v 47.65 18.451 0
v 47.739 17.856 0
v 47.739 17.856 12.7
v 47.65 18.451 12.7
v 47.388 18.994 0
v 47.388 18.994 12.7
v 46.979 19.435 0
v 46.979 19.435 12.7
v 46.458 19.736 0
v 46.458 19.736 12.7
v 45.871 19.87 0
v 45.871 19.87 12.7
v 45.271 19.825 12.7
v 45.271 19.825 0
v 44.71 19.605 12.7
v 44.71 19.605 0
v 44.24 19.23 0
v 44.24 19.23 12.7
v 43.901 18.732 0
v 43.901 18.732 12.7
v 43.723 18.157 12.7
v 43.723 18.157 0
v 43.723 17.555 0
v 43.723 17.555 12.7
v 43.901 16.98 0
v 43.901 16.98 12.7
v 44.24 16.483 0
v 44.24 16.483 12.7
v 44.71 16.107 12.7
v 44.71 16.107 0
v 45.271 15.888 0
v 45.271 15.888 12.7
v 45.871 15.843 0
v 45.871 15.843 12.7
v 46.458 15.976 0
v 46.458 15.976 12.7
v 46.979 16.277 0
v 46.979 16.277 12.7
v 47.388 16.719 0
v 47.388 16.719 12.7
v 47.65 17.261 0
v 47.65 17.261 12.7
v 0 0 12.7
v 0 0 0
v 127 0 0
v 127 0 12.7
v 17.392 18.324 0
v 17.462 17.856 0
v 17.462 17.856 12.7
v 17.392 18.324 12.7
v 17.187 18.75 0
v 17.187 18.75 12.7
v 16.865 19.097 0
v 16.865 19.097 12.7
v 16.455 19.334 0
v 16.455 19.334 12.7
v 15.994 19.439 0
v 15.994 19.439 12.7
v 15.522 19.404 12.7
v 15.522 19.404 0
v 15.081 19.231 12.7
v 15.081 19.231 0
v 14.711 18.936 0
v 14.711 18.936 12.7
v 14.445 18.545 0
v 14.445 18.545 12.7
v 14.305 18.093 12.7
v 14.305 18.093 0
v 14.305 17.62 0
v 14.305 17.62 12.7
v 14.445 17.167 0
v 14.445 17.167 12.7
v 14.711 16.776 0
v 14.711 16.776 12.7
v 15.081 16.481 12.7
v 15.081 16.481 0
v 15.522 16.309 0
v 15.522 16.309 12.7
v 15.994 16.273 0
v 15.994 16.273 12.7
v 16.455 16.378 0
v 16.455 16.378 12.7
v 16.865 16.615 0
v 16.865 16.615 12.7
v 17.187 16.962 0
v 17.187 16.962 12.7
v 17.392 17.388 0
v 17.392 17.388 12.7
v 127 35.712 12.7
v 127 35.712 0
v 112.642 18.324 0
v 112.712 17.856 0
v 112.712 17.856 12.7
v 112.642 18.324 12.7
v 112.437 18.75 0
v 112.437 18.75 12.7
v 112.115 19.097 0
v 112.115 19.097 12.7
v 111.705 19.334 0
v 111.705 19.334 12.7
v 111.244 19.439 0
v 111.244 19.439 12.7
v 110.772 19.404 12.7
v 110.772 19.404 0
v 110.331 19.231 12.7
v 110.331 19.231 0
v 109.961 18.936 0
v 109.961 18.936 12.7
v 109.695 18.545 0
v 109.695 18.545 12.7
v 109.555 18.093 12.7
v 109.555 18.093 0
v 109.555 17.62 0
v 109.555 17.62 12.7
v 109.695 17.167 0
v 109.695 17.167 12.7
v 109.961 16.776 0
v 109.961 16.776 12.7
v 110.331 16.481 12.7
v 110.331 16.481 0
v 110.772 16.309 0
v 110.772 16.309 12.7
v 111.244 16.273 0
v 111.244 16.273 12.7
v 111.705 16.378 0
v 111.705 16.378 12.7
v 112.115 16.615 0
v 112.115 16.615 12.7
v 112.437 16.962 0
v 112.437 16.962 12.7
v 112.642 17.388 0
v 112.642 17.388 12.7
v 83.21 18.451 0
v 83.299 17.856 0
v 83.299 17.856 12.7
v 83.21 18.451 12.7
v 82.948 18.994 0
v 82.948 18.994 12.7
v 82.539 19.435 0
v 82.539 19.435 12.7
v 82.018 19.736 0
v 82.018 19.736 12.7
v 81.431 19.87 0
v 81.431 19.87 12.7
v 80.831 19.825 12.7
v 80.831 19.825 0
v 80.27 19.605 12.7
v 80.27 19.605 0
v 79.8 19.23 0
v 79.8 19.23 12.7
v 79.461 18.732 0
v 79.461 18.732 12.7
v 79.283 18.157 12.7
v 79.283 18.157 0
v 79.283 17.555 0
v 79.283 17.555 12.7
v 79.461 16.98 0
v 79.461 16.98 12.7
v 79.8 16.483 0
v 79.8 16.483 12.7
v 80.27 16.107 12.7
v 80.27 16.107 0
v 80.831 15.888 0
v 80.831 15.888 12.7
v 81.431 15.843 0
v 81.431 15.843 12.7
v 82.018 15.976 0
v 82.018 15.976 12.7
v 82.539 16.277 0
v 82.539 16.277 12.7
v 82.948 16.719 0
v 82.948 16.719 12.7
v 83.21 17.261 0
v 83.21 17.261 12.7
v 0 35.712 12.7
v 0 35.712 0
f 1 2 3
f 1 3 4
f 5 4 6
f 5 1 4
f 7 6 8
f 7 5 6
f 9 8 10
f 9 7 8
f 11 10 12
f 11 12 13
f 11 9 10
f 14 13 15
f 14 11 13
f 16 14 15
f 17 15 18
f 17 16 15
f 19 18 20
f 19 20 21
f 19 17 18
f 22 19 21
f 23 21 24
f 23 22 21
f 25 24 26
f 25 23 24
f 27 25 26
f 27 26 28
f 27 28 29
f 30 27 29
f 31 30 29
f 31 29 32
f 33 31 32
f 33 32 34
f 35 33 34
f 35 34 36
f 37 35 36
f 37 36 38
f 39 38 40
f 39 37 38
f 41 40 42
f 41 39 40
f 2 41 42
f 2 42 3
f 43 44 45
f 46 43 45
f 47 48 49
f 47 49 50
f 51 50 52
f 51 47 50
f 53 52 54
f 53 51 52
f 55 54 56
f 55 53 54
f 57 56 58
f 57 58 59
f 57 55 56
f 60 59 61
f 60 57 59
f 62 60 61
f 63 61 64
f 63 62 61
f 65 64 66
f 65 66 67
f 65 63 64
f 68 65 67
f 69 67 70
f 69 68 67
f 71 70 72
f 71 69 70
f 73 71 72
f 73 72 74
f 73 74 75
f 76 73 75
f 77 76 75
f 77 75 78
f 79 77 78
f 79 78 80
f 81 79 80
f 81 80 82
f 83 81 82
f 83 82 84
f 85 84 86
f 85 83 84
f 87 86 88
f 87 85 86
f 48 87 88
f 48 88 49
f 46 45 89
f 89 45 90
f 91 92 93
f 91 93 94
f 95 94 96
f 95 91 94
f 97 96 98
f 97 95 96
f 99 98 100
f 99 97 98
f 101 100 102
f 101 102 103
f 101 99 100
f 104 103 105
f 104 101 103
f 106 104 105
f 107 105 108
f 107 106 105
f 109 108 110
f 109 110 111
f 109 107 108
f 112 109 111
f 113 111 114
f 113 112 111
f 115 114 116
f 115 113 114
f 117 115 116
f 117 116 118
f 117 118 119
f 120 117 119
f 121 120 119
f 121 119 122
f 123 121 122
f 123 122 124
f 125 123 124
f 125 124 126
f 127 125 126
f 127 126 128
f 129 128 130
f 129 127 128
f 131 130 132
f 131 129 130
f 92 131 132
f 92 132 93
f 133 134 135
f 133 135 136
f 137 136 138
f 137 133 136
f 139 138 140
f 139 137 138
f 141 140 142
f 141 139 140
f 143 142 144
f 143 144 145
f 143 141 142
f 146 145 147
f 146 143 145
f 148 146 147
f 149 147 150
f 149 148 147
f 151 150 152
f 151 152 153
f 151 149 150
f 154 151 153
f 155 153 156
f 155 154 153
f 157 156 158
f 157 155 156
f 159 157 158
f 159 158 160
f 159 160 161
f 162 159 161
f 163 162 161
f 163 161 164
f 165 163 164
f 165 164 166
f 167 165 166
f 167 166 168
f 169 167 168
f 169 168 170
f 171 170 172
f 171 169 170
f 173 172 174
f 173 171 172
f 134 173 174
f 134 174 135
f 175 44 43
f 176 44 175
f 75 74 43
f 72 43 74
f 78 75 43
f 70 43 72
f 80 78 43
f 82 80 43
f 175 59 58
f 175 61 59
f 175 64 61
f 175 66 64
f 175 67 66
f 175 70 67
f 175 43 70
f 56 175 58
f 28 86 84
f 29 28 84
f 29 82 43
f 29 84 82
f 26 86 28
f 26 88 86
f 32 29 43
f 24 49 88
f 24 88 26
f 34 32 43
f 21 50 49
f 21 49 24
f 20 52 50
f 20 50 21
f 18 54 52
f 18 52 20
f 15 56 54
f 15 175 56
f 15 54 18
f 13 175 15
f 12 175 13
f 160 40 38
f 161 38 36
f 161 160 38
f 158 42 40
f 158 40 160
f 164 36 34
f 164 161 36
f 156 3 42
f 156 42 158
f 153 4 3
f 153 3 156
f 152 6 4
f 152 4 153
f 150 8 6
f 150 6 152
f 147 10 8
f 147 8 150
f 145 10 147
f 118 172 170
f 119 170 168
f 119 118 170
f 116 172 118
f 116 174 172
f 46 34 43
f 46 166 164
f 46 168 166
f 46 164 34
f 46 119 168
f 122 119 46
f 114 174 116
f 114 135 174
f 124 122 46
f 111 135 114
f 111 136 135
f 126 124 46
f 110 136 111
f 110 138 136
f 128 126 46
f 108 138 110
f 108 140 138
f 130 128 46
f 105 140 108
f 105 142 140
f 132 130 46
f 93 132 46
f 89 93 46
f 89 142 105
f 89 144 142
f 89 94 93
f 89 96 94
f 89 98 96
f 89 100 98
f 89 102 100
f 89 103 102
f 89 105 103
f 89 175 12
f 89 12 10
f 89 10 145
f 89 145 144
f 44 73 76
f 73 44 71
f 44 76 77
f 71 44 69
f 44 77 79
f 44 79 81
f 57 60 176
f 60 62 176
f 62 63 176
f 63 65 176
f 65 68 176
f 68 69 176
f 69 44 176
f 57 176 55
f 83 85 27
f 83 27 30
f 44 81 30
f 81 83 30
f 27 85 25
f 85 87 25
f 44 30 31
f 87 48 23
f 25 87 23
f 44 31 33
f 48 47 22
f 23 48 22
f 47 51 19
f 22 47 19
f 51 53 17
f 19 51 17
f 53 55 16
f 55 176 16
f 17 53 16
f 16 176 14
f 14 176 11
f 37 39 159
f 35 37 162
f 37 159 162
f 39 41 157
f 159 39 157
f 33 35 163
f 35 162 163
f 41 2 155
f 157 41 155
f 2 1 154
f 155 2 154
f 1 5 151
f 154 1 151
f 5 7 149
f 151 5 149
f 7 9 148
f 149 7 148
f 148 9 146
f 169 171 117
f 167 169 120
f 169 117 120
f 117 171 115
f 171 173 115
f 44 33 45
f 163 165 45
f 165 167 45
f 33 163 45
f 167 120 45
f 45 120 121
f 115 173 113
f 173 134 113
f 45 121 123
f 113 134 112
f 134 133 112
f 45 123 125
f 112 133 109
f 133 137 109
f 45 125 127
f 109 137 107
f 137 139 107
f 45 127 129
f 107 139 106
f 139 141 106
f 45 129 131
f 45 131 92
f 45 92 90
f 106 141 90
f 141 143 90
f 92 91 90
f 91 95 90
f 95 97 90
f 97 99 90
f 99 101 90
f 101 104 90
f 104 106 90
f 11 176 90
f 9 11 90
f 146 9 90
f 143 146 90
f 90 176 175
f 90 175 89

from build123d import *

# Parameters (mm, degrees)
F0_W     = 127
F0_H     = 35.7124
F0_R     = 1.5875
F0_R_2   = 4.6228
F0_R_3   = 2.0193
F1_DEPTH = 12.7


with BuildPart() as f1:
    # F0 (on Top) → F1 (new body)
    with BuildSketch(Plane.XY):
        with Locations((63.5, 17.8562)):
            Rectangle(F0_W, F0_H)
        with Locations((15.875, 17.8562)):
            Circle(F0_R, mode=Mode.SUBTRACT)
        with Locations((45.72, 17.8562)):
            Circle(F0_R_2, mode=Mode.SUBTRACT)
        with Locations((81.28, 17.8562)):
            Circle(F0_R_2, mode=Mode.SUBTRACT)
        with Locations((111.125, 17.8562)):
            Circle(F0_R, mode=Mode.SUBTRACT)
        with Locations((45.72, 17.8562)):
            Circle(F0_R_2)
        with Locations((45.72, 17.8562)):
            Circle(F0_R_3, mode=Mode.SUBTRACT)
        with Locations((81.28, 17.8562)):
            Circle(F0_R_2)
        with Locations((81.28, 17.8562)):
            Circle(F0_R_3, mode=Mode.SUBTRACT)
    extrude(amount=F1_DEPTH)


solid = f1.part
